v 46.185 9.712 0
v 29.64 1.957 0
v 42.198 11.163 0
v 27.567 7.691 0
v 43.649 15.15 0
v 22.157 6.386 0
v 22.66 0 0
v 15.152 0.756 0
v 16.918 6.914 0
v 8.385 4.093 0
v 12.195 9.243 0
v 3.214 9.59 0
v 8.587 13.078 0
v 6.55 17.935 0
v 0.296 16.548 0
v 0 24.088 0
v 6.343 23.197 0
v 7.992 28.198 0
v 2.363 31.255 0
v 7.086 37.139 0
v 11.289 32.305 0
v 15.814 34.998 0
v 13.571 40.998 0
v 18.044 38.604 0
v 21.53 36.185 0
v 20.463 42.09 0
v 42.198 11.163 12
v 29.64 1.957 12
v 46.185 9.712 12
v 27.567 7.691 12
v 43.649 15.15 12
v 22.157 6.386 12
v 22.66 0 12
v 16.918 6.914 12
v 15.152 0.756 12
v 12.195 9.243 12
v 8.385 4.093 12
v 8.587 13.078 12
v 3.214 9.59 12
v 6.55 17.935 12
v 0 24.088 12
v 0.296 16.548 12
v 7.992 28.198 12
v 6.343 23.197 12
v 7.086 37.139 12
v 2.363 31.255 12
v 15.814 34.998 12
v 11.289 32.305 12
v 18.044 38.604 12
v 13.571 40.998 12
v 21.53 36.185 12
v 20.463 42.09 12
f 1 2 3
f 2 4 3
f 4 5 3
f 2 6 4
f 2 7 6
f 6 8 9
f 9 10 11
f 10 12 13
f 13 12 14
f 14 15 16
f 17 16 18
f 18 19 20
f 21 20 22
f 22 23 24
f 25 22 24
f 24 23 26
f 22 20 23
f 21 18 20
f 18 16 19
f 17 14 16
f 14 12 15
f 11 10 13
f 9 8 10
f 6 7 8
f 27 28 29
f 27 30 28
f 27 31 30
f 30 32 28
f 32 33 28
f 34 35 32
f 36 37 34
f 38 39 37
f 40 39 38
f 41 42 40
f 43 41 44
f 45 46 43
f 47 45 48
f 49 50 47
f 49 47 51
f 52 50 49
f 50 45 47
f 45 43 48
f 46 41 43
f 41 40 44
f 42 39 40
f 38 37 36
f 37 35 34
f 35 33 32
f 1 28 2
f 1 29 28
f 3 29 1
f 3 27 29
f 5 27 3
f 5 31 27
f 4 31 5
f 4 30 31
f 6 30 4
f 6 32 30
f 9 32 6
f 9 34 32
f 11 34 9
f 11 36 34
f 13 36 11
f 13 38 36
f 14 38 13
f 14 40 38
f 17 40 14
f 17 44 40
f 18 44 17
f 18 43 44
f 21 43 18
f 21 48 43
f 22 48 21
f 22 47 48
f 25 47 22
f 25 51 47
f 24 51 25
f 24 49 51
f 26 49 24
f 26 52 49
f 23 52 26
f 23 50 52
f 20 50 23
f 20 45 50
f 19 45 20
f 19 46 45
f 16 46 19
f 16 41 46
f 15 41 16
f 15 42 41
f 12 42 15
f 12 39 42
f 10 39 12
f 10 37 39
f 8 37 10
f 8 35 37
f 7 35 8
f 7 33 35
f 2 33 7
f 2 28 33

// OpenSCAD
$fn = 32;

// ----------------------------------------------------------------------
// Hook plate: curl radius 18 mm over 205 degrees, 6 mm thick band
// ----------------------------------------------------------------------

// --- parameters (mm) ---
profile_height = 12;      // extrusion height
profile_points = 26;      // points of the closed outline

profile = [[18.044, 38.604], [20.463, 42.09], [13.571, 40.998], [7.086, 37.139], [2.363, 31.255], [0, 24.088], [0.296, 16.548], [3.214, 9.59], [8.385, 4.093], [15.152, 0.756], [22.66, 0], [29.64, 1.957], [46.185, 9.712], [42.198, 11.163], [43.649, 15.15], [27.567, 7.691], [22.157, 6.386], [16.918, 6.914], [12.195, 9.243], [8.587, 13.078], [6.55, 17.935], [6.343, 23.197], [7.992, 28.198], [11.289, 32.305], [15.814, 34.998], [21.53, 36.185]];  // single closed polygon, 26 points, counter clockwise

// --- the one profile operation ---
linear_extrude(height = profile_height) polygon(points = profile);
